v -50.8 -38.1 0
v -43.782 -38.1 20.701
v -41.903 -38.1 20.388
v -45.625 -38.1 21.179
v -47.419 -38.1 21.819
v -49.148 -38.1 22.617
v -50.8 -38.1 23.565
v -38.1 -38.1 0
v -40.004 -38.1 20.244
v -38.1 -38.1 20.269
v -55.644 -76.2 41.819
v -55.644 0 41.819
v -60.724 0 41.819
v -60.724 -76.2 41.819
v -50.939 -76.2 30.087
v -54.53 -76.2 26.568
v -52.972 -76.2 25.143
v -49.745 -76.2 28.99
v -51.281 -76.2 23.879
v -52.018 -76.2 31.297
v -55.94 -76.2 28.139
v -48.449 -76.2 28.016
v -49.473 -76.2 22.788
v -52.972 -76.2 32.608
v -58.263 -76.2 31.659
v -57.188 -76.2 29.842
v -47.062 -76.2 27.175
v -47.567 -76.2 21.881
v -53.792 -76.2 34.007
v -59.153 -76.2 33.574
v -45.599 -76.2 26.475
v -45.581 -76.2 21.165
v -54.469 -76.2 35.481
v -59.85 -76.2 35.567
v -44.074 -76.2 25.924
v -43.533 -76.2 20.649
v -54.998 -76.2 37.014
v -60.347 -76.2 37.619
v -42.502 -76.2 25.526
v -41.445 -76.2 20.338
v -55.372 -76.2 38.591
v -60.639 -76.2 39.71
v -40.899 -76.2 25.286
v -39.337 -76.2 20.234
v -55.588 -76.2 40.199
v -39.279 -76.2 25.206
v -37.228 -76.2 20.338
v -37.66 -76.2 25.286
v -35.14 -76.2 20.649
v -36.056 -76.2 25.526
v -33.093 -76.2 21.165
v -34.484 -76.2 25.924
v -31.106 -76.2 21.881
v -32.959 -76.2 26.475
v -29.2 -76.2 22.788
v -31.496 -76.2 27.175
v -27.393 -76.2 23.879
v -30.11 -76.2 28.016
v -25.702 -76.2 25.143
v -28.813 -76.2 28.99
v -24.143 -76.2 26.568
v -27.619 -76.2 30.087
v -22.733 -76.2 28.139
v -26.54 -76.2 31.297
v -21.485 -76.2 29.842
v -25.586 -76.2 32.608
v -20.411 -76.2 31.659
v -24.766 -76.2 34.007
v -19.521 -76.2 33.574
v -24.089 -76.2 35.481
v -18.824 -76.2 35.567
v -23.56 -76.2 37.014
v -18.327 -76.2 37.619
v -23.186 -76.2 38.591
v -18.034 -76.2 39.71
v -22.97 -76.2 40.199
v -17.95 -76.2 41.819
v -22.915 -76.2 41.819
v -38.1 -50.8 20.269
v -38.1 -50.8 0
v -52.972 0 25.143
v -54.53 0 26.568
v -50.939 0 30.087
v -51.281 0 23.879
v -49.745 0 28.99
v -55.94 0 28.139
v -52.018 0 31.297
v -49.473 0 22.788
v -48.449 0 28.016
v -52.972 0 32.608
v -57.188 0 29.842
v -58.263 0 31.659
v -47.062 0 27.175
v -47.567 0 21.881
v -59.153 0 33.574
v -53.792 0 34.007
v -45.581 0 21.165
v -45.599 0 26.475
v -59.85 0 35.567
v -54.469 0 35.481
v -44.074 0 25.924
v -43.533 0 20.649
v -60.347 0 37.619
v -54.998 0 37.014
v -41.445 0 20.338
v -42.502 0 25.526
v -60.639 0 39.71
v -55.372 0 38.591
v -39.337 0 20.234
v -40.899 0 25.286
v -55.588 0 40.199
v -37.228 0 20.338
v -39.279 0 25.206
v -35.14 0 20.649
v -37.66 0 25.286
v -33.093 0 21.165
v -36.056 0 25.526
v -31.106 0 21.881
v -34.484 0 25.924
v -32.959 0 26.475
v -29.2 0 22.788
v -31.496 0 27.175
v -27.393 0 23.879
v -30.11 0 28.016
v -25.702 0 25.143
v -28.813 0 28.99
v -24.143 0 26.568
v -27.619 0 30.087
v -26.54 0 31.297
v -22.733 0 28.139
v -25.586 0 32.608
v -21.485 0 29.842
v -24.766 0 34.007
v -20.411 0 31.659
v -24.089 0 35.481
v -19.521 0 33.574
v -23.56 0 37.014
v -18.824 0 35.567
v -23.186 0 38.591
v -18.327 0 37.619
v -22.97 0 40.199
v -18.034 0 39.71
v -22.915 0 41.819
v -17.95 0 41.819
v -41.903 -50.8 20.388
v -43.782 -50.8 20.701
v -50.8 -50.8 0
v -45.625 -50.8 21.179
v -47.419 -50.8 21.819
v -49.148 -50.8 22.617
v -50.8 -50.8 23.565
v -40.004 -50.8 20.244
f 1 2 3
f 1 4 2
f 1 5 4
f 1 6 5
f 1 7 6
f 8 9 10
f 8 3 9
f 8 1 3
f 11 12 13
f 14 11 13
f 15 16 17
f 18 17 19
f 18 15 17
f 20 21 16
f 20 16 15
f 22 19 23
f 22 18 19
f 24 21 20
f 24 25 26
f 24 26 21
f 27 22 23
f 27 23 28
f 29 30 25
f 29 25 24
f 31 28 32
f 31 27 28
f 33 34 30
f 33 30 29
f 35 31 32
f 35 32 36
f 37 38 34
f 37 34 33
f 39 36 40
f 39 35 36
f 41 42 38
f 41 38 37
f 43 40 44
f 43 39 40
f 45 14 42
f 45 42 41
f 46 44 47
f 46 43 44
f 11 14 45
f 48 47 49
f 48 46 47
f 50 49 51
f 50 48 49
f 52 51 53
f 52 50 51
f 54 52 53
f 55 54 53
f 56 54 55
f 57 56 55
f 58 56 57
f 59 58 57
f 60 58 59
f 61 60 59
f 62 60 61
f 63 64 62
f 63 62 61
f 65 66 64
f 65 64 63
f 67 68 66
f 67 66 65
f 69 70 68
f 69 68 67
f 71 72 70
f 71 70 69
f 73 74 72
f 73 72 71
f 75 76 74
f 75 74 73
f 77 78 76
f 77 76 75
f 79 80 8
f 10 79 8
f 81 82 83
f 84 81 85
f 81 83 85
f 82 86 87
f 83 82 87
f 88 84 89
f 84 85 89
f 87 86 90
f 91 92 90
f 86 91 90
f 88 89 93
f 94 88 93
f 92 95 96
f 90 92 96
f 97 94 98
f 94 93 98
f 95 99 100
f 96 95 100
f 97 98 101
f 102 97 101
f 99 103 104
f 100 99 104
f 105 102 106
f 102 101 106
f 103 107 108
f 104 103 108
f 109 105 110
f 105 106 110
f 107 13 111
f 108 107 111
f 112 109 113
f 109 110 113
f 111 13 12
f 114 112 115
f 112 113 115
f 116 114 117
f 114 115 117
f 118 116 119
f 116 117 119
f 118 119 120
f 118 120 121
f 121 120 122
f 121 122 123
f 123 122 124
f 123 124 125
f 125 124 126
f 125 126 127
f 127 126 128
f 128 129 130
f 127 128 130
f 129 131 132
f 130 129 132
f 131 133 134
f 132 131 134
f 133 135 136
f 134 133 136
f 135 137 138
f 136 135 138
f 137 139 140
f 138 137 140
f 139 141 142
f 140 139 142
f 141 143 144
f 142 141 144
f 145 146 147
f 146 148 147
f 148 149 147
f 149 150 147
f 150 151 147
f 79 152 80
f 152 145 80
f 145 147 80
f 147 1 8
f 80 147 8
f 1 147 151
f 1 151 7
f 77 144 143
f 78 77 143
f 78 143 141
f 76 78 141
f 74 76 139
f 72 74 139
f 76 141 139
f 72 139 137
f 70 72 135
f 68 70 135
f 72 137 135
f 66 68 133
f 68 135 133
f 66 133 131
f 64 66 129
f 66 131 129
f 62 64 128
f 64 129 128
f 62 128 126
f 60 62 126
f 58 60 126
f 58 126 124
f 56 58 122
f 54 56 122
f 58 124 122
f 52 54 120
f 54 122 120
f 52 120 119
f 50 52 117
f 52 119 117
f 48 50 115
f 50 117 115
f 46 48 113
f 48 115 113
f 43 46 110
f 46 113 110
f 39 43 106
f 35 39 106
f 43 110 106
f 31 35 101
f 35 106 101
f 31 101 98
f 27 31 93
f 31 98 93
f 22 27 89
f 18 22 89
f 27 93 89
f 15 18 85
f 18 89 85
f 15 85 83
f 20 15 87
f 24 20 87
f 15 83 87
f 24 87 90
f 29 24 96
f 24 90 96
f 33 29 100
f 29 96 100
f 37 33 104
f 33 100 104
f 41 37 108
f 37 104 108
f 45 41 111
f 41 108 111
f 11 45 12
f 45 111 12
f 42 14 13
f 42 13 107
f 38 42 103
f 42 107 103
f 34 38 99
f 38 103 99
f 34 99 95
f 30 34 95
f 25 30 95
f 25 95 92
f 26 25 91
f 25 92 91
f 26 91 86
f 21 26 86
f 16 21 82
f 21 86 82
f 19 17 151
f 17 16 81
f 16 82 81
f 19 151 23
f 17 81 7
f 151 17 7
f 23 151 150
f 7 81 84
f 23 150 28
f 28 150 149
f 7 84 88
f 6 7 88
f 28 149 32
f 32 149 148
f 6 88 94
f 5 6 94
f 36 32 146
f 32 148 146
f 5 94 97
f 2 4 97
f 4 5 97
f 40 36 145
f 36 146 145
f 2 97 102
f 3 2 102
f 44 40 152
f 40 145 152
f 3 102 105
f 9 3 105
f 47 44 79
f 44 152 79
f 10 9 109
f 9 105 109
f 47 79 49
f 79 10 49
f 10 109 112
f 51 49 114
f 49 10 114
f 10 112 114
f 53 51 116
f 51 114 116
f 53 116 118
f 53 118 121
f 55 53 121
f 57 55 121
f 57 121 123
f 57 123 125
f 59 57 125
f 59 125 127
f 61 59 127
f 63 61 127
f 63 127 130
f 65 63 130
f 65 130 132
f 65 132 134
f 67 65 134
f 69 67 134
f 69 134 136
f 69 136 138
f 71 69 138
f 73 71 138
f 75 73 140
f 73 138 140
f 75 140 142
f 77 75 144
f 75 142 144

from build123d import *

# Parameters (mm, degrees)
F1_DEPTH = 76.2
F2_W     = 12.7
F2_H     = 12.7
F3_DEPTH = 23.622


with BuildPart() as f1:
    # F0 (on Front) → F1 (new body)
    with BuildSketch(Plane.XZ):
        with BuildLine():
            Line((-55.64358, 41.81907), (-60.72358, 41.81907))
            ThreePointArc((-60.72358, 41.81907), (-39.336659, 20.23352), (-17.949738, 41.81907))
            Line((-17.949738, 41.81907), (-22.914561, 41.81907))
            ThreePointArc((-22.914561, 41.81907), (-39.27907, 25.205913), (-55.64358, 41.81907))
        make_face()
    extrude(amount=F1_DEPTH)

    # F2 (on Top) → F3 (join)
    with BuildSketch(Plane.XY):
        with Locations((-44.45, -44.45)):
            Rectangle(F2_W, F2_H)
    extrude(amount=F3_DEPTH)


solid = f1.part
